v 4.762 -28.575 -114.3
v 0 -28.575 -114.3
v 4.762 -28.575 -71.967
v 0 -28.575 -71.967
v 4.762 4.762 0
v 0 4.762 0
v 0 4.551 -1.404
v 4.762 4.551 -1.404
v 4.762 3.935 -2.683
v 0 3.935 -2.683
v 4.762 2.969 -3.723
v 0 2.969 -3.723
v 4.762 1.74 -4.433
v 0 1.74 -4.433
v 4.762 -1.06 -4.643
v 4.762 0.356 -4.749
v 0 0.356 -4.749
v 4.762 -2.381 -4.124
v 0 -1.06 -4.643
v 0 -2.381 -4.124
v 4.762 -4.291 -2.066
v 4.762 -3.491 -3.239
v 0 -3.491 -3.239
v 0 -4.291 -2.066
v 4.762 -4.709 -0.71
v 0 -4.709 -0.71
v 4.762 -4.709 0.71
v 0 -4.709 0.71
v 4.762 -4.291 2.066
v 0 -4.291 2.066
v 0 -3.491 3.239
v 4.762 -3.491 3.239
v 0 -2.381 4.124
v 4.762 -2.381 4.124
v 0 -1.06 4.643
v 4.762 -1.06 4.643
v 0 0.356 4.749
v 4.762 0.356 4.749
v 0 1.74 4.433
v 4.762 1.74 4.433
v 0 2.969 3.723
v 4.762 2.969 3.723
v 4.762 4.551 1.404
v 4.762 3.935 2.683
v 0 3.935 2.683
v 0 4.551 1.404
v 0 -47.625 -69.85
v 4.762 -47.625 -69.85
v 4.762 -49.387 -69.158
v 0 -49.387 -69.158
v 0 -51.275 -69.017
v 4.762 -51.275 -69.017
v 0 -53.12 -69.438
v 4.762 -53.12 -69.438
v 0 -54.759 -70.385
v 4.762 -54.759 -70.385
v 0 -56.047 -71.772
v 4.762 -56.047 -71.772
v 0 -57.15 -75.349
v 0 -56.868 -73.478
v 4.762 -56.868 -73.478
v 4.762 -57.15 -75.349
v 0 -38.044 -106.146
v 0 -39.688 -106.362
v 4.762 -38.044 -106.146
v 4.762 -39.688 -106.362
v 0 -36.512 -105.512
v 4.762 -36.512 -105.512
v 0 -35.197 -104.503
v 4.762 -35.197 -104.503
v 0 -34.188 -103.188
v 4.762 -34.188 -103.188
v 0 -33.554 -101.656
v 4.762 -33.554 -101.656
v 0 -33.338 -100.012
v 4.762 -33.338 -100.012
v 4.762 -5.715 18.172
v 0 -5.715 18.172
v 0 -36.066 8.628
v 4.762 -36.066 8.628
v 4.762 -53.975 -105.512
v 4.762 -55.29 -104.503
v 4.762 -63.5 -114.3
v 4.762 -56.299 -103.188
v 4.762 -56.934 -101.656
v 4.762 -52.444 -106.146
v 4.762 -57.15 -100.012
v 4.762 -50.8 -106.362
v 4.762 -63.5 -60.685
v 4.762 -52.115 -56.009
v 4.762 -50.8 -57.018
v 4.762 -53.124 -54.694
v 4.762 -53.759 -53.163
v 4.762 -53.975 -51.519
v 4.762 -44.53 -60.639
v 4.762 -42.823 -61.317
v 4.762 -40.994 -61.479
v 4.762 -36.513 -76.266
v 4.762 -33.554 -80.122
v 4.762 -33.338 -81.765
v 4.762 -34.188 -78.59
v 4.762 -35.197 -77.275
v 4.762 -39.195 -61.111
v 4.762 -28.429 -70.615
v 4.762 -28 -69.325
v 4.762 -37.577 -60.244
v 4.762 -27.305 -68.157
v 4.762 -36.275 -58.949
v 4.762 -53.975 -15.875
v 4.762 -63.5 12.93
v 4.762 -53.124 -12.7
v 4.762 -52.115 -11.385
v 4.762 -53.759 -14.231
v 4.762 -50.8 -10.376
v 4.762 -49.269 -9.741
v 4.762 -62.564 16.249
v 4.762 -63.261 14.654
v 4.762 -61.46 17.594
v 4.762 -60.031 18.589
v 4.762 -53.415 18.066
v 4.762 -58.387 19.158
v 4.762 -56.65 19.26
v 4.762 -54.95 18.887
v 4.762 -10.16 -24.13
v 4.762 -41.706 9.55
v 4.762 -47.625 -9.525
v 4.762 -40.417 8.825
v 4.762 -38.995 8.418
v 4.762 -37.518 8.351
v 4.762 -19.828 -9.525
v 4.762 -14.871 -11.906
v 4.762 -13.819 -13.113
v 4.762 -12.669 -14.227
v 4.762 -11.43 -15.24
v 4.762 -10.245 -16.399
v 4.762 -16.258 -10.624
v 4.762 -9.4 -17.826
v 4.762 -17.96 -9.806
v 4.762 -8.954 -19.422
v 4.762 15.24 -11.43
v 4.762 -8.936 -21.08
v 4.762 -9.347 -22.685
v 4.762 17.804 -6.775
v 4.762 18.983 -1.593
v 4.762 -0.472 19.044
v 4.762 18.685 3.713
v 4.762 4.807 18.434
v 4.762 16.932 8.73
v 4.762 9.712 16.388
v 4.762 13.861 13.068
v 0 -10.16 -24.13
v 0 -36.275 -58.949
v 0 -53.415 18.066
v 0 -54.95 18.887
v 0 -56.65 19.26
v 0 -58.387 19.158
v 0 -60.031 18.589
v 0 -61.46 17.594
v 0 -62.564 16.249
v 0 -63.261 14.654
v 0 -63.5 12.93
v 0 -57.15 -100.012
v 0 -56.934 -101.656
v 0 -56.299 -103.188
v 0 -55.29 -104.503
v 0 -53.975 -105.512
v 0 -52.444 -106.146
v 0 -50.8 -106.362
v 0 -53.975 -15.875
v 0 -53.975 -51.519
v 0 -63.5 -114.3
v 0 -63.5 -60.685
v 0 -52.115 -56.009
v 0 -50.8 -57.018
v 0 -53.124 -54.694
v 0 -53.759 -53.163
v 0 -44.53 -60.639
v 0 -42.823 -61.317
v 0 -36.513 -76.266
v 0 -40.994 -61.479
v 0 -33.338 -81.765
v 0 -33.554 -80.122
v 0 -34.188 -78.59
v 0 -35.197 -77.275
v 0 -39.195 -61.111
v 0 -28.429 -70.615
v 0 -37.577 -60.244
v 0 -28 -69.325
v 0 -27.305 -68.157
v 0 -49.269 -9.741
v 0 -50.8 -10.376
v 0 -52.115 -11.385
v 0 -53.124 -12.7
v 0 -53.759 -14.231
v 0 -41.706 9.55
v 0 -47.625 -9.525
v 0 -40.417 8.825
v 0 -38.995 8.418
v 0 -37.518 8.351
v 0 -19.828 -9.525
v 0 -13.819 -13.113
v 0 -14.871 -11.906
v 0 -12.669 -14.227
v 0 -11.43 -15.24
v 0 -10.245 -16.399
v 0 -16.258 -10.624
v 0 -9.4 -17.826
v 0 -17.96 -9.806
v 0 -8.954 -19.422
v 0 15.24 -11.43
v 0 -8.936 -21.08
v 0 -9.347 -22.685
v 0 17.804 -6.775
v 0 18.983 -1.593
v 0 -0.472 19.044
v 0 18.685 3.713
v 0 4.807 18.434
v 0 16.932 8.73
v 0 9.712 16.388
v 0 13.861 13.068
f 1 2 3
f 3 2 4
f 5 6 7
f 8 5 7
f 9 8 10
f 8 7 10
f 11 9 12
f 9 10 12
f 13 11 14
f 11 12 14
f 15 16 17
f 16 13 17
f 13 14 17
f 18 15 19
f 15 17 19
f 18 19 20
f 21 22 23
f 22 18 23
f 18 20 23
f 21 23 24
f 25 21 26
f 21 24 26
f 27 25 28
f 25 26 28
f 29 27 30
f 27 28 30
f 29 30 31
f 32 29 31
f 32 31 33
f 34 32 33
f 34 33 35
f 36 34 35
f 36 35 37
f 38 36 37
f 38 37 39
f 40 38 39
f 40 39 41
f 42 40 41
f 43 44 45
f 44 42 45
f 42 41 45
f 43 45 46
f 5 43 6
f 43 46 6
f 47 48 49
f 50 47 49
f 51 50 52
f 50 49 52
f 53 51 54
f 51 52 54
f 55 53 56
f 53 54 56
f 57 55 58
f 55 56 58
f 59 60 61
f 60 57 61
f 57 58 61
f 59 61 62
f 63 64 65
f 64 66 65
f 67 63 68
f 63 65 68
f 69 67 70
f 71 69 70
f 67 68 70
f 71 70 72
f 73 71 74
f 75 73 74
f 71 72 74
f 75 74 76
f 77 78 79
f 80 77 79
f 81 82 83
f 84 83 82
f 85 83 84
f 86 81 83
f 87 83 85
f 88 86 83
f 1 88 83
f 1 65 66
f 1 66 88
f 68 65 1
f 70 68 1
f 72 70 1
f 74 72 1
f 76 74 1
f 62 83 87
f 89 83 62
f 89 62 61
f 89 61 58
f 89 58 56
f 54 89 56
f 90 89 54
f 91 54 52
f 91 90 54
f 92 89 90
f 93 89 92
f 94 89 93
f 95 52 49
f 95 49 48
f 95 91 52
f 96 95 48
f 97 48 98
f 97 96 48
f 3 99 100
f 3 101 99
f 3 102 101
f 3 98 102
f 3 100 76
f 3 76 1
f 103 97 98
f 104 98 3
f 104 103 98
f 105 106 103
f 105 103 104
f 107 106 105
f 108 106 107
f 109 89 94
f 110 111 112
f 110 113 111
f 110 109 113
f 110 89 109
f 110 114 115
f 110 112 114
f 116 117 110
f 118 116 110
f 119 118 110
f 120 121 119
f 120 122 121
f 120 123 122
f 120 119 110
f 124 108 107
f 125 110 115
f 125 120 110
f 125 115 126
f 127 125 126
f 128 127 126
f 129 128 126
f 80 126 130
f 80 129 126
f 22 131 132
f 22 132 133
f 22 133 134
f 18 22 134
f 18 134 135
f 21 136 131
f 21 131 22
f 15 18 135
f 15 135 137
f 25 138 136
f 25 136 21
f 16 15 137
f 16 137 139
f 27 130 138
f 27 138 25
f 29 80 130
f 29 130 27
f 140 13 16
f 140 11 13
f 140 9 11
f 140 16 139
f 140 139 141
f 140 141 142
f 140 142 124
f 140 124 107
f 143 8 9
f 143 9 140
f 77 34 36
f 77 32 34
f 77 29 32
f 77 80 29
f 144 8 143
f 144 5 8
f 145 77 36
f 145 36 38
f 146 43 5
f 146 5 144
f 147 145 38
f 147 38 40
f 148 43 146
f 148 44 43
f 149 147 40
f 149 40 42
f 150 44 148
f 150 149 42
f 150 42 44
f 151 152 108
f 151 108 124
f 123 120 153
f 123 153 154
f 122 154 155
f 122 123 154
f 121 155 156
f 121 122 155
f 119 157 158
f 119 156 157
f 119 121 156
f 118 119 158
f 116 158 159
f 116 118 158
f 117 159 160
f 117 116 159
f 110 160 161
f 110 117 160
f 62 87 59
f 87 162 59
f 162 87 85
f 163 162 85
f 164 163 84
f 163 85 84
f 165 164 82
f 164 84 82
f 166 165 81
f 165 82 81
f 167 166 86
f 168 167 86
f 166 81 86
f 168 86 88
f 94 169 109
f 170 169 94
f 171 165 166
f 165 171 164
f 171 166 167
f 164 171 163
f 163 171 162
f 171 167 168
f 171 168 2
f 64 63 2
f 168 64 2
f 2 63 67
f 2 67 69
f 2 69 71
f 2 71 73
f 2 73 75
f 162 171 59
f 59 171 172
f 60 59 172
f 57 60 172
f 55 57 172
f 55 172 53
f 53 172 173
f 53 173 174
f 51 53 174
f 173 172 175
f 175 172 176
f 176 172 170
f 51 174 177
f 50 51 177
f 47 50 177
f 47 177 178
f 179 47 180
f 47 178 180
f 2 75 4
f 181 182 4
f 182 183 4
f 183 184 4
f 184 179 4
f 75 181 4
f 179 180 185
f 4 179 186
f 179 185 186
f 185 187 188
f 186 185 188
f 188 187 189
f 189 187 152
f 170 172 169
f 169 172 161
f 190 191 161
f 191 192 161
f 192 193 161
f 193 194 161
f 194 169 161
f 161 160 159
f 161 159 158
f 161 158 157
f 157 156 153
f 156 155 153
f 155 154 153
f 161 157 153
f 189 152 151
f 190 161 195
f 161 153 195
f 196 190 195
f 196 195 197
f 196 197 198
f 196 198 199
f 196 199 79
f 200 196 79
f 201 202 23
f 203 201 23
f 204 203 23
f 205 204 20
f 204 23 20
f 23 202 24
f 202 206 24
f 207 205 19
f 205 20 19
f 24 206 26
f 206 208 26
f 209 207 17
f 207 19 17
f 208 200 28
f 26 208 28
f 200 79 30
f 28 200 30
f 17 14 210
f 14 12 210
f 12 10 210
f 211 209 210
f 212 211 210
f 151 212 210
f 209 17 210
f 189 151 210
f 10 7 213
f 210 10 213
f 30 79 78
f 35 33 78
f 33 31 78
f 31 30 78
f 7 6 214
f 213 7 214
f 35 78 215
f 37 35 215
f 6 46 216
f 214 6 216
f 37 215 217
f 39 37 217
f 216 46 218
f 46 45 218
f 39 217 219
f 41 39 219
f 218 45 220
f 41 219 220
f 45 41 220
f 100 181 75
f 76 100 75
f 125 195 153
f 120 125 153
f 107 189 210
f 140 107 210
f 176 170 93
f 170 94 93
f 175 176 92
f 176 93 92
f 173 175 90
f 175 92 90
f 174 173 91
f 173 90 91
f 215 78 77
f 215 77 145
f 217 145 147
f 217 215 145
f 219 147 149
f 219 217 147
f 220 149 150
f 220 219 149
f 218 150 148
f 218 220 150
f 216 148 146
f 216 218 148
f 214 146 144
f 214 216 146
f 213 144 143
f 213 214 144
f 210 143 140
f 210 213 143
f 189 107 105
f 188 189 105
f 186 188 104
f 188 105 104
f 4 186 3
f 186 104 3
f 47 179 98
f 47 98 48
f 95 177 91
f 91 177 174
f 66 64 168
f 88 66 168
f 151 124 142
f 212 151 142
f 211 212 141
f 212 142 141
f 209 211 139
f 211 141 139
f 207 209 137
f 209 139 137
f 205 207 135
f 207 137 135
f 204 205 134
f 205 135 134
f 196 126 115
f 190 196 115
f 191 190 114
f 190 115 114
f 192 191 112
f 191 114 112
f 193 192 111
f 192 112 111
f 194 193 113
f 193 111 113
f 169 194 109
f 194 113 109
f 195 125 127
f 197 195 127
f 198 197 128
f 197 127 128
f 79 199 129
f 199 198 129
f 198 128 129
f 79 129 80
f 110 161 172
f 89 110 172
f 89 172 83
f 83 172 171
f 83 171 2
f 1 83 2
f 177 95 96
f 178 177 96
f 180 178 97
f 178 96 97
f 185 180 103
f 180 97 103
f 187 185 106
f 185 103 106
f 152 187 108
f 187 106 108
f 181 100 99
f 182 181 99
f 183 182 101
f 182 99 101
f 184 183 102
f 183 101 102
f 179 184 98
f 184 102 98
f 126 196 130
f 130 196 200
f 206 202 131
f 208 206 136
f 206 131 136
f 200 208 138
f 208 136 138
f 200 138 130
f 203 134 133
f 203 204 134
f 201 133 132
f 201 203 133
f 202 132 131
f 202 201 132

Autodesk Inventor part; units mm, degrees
ref_plane "YZ Plane" through (0, 0, 0) normal (1, 0, 0) x (0, 1, 0)
ref_plane "XZ Plane" through (0, 0, 0) normal (0, 1, 0) x (-1, 0, 0)
ref_plane "XY Plane" through (0, 0, 0) normal (0, 0, 1) x (1, 0, 0)
sketch "Sketch1" plane through (0, 0, 0) normal (1, 0, 0) x (0, 1, 0)
  circle A0 centre (0, 0) radius 4.7625
  line L0 (0, 0) -> (-63.5, 0) construction
  circle A1 centre (0, 0) radius 19.05
  line L1 (-5.715, 18.1725) -> (-63.5, 0)
  line L2 (-63.5, 0) -> (-63.5, -114.3)
  circle A2 centre (0, 0) radius 76.2 construction
  line L3 (-63.5, -114.3) -> (-28.575, -114.3)
  line L4 (-28.575, -114.3) -> (-28.575, -69.85)
  line L5 (-28.575, -69.85) -> (-63.5, -49.686)
  line L6 (-28.575, -69.85) -> (15.24, -11.43)
  line L7 (-39.6531, -63.4541) -> (-5.6963, -18.1784)
  line L8 (-53.975, -9.525) -> (-53.975, -55.1853)
  line L9 (-33.3375, -78.0989) -> (-63.5, -60.6846)
  line L10 (-33.3375, -78.0989) -> (-33.3375, -106.3625)
  line L11 (-33.3375, -106.3625) -> (-57.15, -106.3625)
  line L12 (-57.15, -106.3625) -> (-57.15, -64.3507)
  line L13 (-53.975, -9.525) -> (-52.0847, -9.525)
  line L14 (-52.0847, -9.525) -> (-16.4978, -9.525)
  line L15 (-63.5, 0) -> (-28.575, 0)
  line L16 (-28.575, 0) -> (-28.575, 25.4) construction
  line L17 (-28.575, 25.4) -> (-63.5, 25.4) construction
  line L18 (-63.5, 25.4) -> (-63.5, 0)
  line L19 (-28.575, 0) -> (-63.5, 25.4)
  point P0 (-39.1181, 7.6677)
  dimension "d0" = 9.525
  dimension "d1" = 63.5
  dimension "d2" = 38.1
  dimension "d3" = 114.3
  dimension "d4" = 152.4
  dimension "d5" = 34.925
  dimension "d6" = 44.45
  dimension "d7" = 60
  dimension "d9" = 12.7
  dimension "d10" = 9.525
  dimension "d11" = 9.525
  dimension "d12" = 7.9375
  dimension "d13" = 6.35
  dimension "d14" = 4.7625
  dimension "d17" = 9.525
  dimension "d19" = 34.925
  dimension "d20" = 25.4
extrude "Extrusion1" add sketch "Sketch1" along normal blind 4.7625 contours A1 | A1 L14 L13 L8 L5 L2 L15 L19 L1 | L6 L5 L7 A1 | L19 L15 L1 | L1 L18 L19 | L4 L3 L2 L5
fillet "Fillet1" radius 6.35 10 edges at (2.3813, -5.6963, -18.1784) (2.3813, -16.4978, -9.525) (2.3813, -39.6531, -63.4541) (2.3813, -53.975, -9.525) (2.3813, -53.975, -55.1853) (2.3813, -57.15, -64.3507) (2.3813, -33.3375, -78.0989) (2.3813, -33.3375, -106.3625) (2.3813, -57.15, -106.3625) (2.3813, -28.575, -69.85)
fillet "Fillet2" radius 6.35 2 edges at (2.3813, -63.5, 25.4) (2.3813, -39.1181, 7.6677)
sketch "Sketch2" plane through (4.7625, 0, 0) normal (1, 0, 0) x (0, 0, -1)
  circle A0 centre (0, 0) radius 4.7625 projected
  circle A1 centre (0, 0) radius 11.1125
  dimension "d24" = 22.225
equation "\"d9\" = d8"
equation "\"d8\" = 12.7"
properties part number "Upright" material "Aluminum 6061"
